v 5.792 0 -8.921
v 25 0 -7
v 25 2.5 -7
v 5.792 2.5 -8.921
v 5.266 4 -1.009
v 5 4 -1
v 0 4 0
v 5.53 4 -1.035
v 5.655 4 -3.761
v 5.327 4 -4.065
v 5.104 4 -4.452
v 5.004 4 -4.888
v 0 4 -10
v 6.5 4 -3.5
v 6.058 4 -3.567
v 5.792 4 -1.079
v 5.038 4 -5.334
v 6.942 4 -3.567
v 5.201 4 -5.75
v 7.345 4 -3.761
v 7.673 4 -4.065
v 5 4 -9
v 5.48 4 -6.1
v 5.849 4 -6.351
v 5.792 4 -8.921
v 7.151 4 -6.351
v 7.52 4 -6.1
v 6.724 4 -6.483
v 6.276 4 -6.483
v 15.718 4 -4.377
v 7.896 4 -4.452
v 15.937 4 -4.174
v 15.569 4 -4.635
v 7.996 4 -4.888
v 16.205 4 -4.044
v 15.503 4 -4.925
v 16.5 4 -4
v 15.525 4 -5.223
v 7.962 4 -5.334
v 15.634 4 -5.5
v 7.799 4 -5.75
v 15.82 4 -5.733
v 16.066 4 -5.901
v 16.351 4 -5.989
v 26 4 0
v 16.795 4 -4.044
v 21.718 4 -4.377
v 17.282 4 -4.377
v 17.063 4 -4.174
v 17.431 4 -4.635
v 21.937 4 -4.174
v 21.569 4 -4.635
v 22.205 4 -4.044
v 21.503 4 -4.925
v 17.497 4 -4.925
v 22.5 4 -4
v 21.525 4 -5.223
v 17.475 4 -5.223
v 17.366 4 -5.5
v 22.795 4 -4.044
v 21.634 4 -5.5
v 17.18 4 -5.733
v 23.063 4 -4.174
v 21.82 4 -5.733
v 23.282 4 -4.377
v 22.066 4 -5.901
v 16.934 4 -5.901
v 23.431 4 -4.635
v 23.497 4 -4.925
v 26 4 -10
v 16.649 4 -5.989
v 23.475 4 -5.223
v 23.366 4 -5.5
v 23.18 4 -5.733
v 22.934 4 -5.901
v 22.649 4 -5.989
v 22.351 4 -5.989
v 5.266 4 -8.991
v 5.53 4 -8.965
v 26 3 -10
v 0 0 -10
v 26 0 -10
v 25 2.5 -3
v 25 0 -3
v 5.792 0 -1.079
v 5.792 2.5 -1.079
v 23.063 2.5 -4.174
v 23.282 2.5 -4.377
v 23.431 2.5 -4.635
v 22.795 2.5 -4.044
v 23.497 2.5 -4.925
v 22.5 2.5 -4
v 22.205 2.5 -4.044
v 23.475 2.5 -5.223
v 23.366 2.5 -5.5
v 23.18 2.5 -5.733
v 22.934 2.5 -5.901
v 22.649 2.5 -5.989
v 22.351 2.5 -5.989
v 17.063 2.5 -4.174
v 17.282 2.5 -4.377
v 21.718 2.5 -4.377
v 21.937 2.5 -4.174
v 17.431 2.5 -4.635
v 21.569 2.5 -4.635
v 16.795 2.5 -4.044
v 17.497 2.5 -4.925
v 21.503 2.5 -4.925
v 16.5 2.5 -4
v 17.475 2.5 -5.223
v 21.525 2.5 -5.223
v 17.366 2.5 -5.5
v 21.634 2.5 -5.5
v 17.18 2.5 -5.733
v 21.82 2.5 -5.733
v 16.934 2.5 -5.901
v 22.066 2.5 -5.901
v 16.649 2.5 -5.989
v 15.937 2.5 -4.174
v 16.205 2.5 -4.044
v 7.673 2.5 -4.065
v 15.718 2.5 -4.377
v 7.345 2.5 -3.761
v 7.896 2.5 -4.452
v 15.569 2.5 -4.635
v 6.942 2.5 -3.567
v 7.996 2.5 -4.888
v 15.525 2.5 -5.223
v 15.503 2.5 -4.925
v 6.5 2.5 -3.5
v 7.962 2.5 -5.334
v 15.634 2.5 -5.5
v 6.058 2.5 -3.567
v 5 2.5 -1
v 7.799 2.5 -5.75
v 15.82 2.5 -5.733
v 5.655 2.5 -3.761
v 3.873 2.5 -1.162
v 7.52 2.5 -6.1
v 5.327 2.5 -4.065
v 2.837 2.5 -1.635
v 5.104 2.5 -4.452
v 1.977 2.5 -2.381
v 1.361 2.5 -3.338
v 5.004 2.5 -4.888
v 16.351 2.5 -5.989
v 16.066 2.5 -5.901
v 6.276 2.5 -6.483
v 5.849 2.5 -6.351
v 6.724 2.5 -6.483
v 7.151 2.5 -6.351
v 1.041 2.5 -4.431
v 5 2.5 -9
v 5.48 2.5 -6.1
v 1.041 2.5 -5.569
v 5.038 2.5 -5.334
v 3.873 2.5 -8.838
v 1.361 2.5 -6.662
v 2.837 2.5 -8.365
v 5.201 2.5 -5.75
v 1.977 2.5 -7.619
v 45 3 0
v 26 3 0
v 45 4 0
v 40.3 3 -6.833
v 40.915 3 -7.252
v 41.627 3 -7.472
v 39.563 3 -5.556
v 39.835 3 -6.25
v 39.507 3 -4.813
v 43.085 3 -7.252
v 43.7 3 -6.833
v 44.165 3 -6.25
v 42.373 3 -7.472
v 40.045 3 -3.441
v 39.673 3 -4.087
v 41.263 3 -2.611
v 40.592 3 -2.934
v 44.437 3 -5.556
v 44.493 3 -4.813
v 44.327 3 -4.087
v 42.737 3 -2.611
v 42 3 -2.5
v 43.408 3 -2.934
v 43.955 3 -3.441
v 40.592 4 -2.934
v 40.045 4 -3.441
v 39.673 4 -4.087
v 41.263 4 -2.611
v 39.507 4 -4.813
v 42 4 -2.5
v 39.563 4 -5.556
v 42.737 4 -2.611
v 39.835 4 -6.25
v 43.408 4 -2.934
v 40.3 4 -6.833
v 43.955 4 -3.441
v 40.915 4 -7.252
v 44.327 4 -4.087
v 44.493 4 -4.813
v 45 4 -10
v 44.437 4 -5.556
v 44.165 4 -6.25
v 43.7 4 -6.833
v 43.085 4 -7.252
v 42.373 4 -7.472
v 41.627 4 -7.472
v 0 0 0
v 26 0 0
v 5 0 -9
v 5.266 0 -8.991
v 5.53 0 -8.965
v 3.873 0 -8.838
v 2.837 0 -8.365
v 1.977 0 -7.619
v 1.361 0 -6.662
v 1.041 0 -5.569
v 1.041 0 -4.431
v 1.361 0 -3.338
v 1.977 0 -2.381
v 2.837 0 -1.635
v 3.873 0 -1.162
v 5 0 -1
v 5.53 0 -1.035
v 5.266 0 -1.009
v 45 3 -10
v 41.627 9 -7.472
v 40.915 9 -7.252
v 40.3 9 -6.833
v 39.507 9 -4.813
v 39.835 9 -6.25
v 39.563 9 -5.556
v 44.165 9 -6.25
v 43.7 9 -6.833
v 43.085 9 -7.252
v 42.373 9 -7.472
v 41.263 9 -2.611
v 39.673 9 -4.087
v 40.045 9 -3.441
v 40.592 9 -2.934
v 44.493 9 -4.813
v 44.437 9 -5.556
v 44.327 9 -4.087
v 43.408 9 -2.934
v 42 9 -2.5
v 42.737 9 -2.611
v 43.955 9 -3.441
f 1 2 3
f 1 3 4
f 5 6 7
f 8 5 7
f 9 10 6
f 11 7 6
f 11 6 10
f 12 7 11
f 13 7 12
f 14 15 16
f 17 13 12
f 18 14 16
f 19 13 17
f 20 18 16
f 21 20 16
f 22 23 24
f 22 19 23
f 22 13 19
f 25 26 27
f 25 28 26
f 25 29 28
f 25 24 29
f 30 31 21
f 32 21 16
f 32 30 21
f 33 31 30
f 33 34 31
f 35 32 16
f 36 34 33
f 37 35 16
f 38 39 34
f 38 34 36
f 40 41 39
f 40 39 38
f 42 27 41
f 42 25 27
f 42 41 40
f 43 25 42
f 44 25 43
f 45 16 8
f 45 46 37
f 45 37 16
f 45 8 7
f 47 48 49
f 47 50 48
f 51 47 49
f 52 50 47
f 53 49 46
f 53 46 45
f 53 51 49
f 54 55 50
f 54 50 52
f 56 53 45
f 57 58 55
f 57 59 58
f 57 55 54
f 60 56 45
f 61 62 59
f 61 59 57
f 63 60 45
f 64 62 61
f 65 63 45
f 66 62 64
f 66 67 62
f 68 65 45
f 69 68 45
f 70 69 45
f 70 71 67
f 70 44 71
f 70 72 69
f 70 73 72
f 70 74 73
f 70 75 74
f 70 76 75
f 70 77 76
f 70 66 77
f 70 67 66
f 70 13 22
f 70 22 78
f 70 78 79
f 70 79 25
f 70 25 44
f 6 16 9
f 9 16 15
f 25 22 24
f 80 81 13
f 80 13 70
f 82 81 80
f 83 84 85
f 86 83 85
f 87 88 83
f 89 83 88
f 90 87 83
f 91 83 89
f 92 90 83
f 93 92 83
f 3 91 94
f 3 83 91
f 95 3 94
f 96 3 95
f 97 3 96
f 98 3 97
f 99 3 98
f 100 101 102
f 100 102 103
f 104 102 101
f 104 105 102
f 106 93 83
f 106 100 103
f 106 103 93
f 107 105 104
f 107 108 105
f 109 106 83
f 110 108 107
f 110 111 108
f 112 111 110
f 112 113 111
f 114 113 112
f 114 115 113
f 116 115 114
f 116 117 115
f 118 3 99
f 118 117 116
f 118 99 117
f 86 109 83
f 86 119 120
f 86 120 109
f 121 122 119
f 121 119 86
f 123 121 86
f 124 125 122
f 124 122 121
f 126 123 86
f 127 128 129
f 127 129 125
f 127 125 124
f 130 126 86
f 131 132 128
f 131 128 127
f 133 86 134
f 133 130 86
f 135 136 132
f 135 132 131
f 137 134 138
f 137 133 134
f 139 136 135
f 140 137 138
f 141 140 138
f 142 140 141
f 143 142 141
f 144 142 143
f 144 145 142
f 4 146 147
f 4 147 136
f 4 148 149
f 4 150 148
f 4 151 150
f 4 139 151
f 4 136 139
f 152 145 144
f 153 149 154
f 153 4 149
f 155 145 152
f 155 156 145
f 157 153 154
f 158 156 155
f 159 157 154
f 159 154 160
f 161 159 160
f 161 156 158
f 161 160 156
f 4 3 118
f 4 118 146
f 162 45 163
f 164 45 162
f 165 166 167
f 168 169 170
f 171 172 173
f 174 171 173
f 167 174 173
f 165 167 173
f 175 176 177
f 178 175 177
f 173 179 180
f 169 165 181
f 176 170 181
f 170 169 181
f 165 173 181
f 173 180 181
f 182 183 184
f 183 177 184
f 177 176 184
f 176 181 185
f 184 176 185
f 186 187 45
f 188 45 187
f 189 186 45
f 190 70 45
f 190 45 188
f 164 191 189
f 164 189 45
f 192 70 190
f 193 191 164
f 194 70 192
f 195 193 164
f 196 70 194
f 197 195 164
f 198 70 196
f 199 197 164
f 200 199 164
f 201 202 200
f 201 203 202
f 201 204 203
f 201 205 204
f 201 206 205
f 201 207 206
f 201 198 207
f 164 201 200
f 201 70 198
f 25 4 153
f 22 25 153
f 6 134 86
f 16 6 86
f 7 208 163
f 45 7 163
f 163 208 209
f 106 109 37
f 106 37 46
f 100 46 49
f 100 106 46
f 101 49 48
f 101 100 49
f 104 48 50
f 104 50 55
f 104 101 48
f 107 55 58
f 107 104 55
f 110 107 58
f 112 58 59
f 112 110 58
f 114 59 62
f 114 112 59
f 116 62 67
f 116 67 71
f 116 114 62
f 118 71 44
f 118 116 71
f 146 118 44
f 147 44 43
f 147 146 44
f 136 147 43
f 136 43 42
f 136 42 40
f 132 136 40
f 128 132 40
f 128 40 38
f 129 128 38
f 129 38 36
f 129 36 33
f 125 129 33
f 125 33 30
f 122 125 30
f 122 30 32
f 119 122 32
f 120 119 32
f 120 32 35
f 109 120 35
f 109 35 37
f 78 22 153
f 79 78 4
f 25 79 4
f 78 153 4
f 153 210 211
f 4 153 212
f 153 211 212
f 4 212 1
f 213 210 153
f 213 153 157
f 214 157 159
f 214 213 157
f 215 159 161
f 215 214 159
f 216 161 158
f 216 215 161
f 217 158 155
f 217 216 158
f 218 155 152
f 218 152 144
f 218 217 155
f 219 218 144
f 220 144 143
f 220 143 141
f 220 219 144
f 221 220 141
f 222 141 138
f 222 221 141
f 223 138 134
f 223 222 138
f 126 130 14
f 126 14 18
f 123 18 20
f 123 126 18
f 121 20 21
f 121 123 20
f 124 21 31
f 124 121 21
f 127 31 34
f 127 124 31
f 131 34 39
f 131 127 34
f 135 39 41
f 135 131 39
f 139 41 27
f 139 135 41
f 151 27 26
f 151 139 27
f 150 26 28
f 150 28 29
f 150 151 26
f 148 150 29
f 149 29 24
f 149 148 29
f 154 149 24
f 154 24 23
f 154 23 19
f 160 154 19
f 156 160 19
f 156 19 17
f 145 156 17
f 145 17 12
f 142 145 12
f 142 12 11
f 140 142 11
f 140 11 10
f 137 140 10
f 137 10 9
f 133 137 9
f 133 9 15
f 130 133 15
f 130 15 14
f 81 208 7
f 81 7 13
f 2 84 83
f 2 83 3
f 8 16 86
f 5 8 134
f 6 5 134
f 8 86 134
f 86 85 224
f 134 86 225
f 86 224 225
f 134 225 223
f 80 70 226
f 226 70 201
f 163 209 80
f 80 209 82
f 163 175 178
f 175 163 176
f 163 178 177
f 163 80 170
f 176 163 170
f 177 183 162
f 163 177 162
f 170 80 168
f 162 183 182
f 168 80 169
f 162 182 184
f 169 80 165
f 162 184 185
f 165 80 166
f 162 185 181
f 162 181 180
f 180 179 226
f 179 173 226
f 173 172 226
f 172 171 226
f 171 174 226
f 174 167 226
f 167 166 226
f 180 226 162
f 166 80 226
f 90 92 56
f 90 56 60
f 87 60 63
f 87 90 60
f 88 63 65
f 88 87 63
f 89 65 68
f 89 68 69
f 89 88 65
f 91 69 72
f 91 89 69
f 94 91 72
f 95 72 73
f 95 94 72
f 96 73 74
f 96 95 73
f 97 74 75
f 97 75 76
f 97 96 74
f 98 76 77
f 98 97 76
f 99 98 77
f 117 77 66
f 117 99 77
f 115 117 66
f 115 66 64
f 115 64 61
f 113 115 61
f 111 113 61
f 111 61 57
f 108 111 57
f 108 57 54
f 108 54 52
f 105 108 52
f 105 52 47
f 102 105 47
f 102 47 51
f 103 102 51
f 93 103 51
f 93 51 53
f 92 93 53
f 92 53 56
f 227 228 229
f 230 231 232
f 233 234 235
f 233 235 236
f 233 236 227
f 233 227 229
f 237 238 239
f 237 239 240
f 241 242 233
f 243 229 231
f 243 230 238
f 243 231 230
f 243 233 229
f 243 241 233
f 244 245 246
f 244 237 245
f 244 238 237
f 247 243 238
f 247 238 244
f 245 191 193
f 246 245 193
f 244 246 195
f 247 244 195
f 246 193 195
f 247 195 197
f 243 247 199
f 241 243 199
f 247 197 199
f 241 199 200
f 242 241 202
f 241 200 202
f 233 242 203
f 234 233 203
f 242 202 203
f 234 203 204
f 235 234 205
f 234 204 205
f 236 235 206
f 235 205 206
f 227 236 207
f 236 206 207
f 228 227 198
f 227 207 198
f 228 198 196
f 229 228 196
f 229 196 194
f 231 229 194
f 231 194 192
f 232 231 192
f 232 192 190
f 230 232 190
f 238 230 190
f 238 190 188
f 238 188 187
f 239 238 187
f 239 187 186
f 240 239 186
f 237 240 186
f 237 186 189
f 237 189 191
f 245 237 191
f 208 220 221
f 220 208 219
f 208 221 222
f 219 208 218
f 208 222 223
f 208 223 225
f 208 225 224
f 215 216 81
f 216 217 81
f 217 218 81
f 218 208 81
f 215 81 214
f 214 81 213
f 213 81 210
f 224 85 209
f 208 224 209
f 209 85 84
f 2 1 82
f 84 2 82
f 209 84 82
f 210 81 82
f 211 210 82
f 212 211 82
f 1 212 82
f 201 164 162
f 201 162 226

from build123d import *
from build123d.topology import SkipClean

# Parameters (mm, degrees)
SKETCH1_W                = 26
SKETCH1_H                = 10
SKETCH1_R                = 1.5
SKETCH1_R_2              = 1
MAINBODY_DEPTH           = 4
PUSHEXTRUSION_DEPTH      = 5
PUSHEXTRUSION_DEPTH_BACK = 1
PUSHEXTRUSION_START      = 4
SKETCH1_5_R              = 2.5
SKETCH1_6_W              = 20
SKETCH1_6_H              = 4
SKETCH1_6_R              = 1.5
SKETCH1_6_R_2            = 1
CUT_EXTRUDE1_DEPTH       = 2.5
BOSS_EXTRUDE1_START      = 4
SKETCH1_7_W              = 19
SKETCH1_7_H              = 10
SKETCH1_7_R              = 2.5
BOSS_EXTRUDE1_DEPTH      = 1


with BuildPart() as part:
    # Sketch1 → MainBody (new body)
    with BuildSketch(Plane(origin=(0, 0, 0), x_dir=(1, 0, 0), z_dir=(0, 1, 0))):
        with Locations((13, 5)):
            Rectangle(SKETCH1_W, SKETCH1_H)
        with Locations(Location((6.5, 5, 0), (0, 0, 270))):
            Circle(SKETCH1_R, mode=Mode.SUBTRACT)
        with BuildLine():
            ThreePointArc((5, 9), (5.398014876, 8.980148761), (5.792079208, 8.920792079))
            Line((5.792079208, 8.920792079), (5, 9))
        make_face(mode=Mode.SUBTRACT)
        with BuildLine():
            ThreePointArc((5.792079208, 1.079207921), (5.398014876, 1.019851239), (5, 1))
            Line((5, 1), (5.792079208, 1.079207921))
        make_face(mode=Mode.SUBTRACT)
        with Locations(Location((16.5, 5, 0), (0, 0, 270))):
            Circle(SKETCH1_R_2, mode=Mode.SUBTRACT)
        with Locations(Location((22.5, 5, 0), (0, 0, 270))):
            Circle(SKETCH1_R_2, mode=Mode.SUBTRACT)
    extrude(amount=MAINBODY_DEPTH)

    # Sketch1<6> → Cut-Extrude1 (cut)
    # profile 1 of 4: a face of its own
    with SkipClean():  # the faces are left unmerged after this step: merging them gives an invalid solid
        with BuildSketch(Plane(origin=(0, 0, 0), x_dir=(1, 0, 0), z_dir=(0, 1, 0))):
            with Locations((15, 5)):
                Rectangle(SKETCH1_6_W, SKETCH1_6_H)
            with Locations(Location((6.5, 5, 0), (0, 0, 270))):
                Circle(SKETCH1_6_R, mode=Mode.SUBTRACT)
            with Locations(Location((16.5, 5, 0), (0, 0, 270))):
                Circle(SKETCH1_6_R_2, mode=Mode.SUBTRACT)
            with Locations(Location((22.5, 5, 0), (0, 0, 270))):
                Circle(SKETCH1_6_R_2, mode=Mode.SUBTRACT)
        # profile 2 of 4: a face of its own
        with BuildSketch(Plane(origin=(0, 0, 0), x_dir=(1, 0, 0), z_dir=(0, 1, 0))):
            Polygon((25, 7), (5, 9), (5, 7), align=None)
        # profile 3 of 4: a face of its own
        with BuildSketch(Plane(origin=(0, 0, 0), x_dir=(1, 0, 0), z_dir=(0, 1, 0))):
            Polygon((25, 3), (5, 1), (5, 3), align=None)
        # profile 4 of 4: a face of its own
        with BuildSketch(Plane(origin=(0, 0, 0), x_dir=(1, 0, 0), z_dir=(0, 1, 0))):
            with BuildLine():
                Line((5, 5), (5, 7))
                Line((5, 7), (5, 9))
                ThreePointArc((5, 9), (1, 5), (5, 1))
                Line((5, 1), (5, 3))
                Line((5, 3), (5, 5))
            make_face()
        extrude(amount=CUT_EXTRUDE1_DEPTH, mode=Mode.SUBTRACT)



with BuildPart() as body_2:
    # Sketch1<5> → PushExtrusion (new, two sides: drawn at the far end of the back side and taken through both)
    with BuildSketch(Plane(origin=(0, 0, 0), x_dir=(1, 0, 0), z_dir=(0, 1, 0)).offset(PUSHEXTRUSION_START - PUSHEXTRUSION_DEPTH_BACK)):
        with Locations(Location((42, 5, 0), (0, 0, 270))):
            Circle(SKETCH1_5_R)
    extrude(amount=PUSHEXTRUSION_DEPTH + PUSHEXTRUSION_DEPTH_BACK)


with BuildPart() as part_1:
    with SkipClean():  # the faces are left unmerged after this step: merging them gives an invalid solid
        add(part.part)

        add(body_2.part)  # Boss-Extrude1 merges body 2
        # Sketch1<7> → Boss-Extrude1 (add)
        with BuildSketch(Plane(origin=(0, 0, 0), x_dir=(1, 0, 0), z_dir=(0, 1, 0)).offset(BOSS_EXTRUDE1_START)):
            with Locations((35.5, 5)):
                Rectangle(SKETCH1_7_W, SKETCH1_7_H)
            with Locations(Location((42, 5, 0), (0, 0, 270))):
                Circle(SKETCH1_7_R, mode=Mode.SUBTRACT)
        extrude(amount=-BOSS_EXTRUDE1_DEPTH)


solid = part_1.part
